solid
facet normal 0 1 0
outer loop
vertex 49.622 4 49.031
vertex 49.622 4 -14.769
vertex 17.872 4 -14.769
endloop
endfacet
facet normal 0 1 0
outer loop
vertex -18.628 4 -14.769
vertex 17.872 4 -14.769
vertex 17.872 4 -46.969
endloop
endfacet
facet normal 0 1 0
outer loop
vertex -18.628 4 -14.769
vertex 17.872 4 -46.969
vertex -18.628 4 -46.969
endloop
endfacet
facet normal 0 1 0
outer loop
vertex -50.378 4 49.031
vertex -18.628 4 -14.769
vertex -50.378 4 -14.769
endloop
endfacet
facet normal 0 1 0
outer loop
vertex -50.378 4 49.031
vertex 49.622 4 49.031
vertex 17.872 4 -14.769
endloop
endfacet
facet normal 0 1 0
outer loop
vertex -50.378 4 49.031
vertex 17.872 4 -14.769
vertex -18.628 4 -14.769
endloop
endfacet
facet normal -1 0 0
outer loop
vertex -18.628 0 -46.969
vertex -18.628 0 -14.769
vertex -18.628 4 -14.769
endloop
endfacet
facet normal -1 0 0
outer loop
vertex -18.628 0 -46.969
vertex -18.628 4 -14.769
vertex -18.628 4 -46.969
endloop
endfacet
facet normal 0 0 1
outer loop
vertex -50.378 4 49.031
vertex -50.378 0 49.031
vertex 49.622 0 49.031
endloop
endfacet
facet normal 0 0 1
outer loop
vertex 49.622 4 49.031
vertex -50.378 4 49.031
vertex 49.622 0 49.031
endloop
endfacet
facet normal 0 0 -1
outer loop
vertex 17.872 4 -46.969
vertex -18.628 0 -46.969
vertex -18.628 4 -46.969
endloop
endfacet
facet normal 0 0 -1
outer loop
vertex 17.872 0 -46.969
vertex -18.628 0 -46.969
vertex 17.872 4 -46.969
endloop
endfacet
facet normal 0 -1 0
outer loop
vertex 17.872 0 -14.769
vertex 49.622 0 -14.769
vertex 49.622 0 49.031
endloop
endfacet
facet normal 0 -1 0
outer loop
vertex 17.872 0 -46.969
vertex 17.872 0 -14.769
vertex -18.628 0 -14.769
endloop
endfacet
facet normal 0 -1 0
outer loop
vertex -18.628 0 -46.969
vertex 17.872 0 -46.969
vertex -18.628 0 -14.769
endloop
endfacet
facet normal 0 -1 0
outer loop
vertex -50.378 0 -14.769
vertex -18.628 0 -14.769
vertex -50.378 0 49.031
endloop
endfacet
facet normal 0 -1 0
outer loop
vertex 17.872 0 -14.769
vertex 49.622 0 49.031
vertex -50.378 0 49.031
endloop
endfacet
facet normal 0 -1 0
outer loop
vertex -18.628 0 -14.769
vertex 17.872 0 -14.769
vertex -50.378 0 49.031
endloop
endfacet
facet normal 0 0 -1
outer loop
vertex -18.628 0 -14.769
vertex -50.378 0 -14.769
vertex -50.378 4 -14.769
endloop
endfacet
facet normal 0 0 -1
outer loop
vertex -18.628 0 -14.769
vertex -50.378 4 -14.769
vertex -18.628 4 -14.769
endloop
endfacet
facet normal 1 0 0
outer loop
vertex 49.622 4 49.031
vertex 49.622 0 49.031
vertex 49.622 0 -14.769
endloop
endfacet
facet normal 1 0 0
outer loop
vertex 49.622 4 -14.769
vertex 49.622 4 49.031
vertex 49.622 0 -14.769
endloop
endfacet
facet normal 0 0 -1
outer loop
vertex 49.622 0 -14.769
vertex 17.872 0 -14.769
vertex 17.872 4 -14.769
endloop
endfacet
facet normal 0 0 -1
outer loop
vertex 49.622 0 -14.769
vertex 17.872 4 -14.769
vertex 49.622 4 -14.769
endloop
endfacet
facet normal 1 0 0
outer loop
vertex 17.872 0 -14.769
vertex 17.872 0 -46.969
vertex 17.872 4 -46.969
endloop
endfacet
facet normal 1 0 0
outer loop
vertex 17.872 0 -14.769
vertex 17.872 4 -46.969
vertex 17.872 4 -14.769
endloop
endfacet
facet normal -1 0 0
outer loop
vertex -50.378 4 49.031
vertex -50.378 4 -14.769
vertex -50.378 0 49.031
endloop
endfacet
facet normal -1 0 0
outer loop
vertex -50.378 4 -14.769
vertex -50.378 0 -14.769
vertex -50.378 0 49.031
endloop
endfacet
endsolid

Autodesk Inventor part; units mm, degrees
ref_plane "YZ Plane" through (0, 0, 0) normal (1, 0, 0) x (0, 1, 0)
ref_plane "XZ Plane" through (0, 0, 0) normal (0, 1, 0) x (-1, 0, 0)
ref_plane "XY Plane" through (0, 0, 0) normal (0, 0, 1) x (1, 0, 0)
sketch "Sketch1" plane through (0, 0, 0) normal (0, 1, 0) x (-1, 0, 0)
  line L0 (-49.6221, -50.9693) -> (50.3779, -50.9693)
  line L1 (50.3779, -50.9693) -> (50.3779, 49.0307)
  line L2 (50.3779, 49.0307) -> (-49.6221, 49.0307)
  line L3 (-49.6221, 49.0307) -> (-49.6221, -50.9693)
  line L4 (-17.8721, -0.5117) -> (18.6279, -0.5117)
  line L5 (18.6279, -0.5117) -> (18.6279, -50.9693)
  line L6 (18.6279, -50.9693) -> (-17.8721, -50.9693)
  line L7 (-17.8721, -50.9693) -> (-17.8721, -0.5117)
  line L8 (-49.6221, -18.7693) -> (50.3779, -18.7693)
  line L9 (50.3779, -18.7693) -> (50.3779, -50.9693)
  line L10 (50.3779, -50.9693) -> (-49.6221, -50.9693)
  line L11 (-49.6221, -50.9693) -> (-49.6221, -18.7693)
  line L12 (-49.6221, -18.7693) -> (50.3779, -18.7693)
  line L13 (50.3779, -18.7693) -> (50.3779, -14.7693)
  line L14 (50.3779, -14.7693) -> (-49.6221, -14.7693)
  line L15 (-49.6221, -14.7693) -> (-49.6221, -18.7693)
  line L16 (-49.6221, -34.8693) -> (50.3779, -34.8693)
  line L17 (-49.6221, -50.9693) -> (50.3779, -50.9693)
  line L18 (50.3779, -50.9693) -> (50.3779, -46.9693)
  line L19 (50.3779, -46.9693) -> (-49.6221, -46.9693)
  line L20 (-49.6221, -46.9693) -> (-49.6221, -50.9693)
  point P0 (0, 0)
  point P1 (0.3779, -50.9693)
  point P2 (0.3779, -50.9693)
  point P3 (0.3779, -50.9693)
  point P4 (-49.6221, -14.7693)
  point P5 (-17.8721, -14.7693)
  point P6 (-17.8721, -46.9693)
  point P7 (18.6279, -46.9693)
  point P8 (18.6279, -14.7693)
  dimension "d0" = 100
  dimension "d1" = 100
  dimension "d2" = 36.5
  dimension "d3" = 100
  dimension "d4" = 32.2
  dimension "d5" = 4
  dimension "d6" = 4
extrude "Extrusion1" add sketch "Sketch1" along normal blind 4 contours L7 L16 L5 L19 | L7 L8 L5 L16 | L7 L14 L5 L8 | L3 L2 L1 L14 L5 L4 L7 | L7 L4 L5 L14
properties part number "podstawa"
